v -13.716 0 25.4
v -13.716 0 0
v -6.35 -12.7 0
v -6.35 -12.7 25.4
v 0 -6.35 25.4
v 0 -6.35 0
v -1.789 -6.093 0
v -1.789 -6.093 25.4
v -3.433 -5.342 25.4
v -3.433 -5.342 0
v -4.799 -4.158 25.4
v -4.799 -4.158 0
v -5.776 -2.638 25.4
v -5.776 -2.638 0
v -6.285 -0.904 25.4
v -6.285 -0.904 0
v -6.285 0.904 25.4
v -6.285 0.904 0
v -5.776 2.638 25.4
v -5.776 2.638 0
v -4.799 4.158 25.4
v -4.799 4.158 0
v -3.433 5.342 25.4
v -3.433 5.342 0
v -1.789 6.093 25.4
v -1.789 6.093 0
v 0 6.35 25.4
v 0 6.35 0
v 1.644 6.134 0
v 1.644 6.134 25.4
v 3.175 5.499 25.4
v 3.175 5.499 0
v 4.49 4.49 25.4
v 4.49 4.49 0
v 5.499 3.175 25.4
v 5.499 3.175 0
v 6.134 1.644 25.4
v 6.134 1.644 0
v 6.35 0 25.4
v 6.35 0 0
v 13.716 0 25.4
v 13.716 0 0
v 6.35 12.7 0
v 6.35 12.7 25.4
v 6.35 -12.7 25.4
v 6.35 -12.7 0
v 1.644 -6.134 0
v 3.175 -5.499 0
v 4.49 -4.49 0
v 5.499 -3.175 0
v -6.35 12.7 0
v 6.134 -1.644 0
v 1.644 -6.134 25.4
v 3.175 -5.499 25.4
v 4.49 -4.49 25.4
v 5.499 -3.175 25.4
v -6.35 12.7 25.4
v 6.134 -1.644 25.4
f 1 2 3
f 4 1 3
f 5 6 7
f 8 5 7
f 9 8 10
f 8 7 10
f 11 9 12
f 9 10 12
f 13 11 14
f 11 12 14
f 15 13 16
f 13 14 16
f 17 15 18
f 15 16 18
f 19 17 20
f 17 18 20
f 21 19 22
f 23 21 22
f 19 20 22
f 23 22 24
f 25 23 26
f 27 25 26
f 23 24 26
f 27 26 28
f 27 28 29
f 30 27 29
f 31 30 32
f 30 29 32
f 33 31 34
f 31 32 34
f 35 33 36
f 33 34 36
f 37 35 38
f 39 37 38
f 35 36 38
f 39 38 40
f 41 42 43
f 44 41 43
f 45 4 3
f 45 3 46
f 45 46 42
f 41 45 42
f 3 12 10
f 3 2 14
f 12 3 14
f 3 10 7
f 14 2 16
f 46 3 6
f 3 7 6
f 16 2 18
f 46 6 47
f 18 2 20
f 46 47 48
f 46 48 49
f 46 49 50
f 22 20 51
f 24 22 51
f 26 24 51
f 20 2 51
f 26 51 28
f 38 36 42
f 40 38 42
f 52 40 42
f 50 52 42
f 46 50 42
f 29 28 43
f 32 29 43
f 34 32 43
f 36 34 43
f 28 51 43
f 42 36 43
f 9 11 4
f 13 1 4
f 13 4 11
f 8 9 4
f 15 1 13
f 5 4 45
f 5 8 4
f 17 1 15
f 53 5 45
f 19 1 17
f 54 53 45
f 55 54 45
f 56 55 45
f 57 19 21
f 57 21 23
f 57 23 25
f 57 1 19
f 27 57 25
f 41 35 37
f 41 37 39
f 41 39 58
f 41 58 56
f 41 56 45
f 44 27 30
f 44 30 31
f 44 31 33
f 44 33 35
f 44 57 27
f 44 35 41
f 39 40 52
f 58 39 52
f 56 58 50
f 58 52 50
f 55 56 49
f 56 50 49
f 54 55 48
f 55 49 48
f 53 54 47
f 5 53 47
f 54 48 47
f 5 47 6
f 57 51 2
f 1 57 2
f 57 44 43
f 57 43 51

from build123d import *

# Parameters (mm, degrees)
F1_DEPTH = 25.4


with BuildPart() as f1:
    # F0 (on Top) → F1 (new body)
    with BuildSketch(Plane.XY):
        with BuildLine():
            ThreePointArc((0, -6.35), (-6.35, 0), (0, 6.35))
            Line((0, 6.35), (0, 12.7))
            Line((0, 12.7), (-6.35, 12.7))
            Line((-6.35, 12.7), (-13.716, 0))
            Line((-13.716, 0), (-6.35, -12.7))
            Line((-6.35, -12.7), (0, -12.7))
            Line((0, -12.7), (0, -6.35))
        make_face()
        with BuildLine():
            Line((0, 12.7), (0, 6.35))
            ThreePointArc((0, 6.35), (4.490128, 4.490128), (6.35, 0))
            ThreePointArc((6.35, 0), (4.490128, -4.490128), (0, -6.35))
            Line((0, -6.35), (0, -12.7))
            Line((0, -12.7), (6.35, -12.7))
            Line((6.35, -12.7), (13.716, 0))
            Line((13.716, 0), (6.35, 12.7))
            Line((6.35, 12.7), (0, 12.7))
        make_face()
    extrude(amount=F1_DEPTH)


solid = f1.part
